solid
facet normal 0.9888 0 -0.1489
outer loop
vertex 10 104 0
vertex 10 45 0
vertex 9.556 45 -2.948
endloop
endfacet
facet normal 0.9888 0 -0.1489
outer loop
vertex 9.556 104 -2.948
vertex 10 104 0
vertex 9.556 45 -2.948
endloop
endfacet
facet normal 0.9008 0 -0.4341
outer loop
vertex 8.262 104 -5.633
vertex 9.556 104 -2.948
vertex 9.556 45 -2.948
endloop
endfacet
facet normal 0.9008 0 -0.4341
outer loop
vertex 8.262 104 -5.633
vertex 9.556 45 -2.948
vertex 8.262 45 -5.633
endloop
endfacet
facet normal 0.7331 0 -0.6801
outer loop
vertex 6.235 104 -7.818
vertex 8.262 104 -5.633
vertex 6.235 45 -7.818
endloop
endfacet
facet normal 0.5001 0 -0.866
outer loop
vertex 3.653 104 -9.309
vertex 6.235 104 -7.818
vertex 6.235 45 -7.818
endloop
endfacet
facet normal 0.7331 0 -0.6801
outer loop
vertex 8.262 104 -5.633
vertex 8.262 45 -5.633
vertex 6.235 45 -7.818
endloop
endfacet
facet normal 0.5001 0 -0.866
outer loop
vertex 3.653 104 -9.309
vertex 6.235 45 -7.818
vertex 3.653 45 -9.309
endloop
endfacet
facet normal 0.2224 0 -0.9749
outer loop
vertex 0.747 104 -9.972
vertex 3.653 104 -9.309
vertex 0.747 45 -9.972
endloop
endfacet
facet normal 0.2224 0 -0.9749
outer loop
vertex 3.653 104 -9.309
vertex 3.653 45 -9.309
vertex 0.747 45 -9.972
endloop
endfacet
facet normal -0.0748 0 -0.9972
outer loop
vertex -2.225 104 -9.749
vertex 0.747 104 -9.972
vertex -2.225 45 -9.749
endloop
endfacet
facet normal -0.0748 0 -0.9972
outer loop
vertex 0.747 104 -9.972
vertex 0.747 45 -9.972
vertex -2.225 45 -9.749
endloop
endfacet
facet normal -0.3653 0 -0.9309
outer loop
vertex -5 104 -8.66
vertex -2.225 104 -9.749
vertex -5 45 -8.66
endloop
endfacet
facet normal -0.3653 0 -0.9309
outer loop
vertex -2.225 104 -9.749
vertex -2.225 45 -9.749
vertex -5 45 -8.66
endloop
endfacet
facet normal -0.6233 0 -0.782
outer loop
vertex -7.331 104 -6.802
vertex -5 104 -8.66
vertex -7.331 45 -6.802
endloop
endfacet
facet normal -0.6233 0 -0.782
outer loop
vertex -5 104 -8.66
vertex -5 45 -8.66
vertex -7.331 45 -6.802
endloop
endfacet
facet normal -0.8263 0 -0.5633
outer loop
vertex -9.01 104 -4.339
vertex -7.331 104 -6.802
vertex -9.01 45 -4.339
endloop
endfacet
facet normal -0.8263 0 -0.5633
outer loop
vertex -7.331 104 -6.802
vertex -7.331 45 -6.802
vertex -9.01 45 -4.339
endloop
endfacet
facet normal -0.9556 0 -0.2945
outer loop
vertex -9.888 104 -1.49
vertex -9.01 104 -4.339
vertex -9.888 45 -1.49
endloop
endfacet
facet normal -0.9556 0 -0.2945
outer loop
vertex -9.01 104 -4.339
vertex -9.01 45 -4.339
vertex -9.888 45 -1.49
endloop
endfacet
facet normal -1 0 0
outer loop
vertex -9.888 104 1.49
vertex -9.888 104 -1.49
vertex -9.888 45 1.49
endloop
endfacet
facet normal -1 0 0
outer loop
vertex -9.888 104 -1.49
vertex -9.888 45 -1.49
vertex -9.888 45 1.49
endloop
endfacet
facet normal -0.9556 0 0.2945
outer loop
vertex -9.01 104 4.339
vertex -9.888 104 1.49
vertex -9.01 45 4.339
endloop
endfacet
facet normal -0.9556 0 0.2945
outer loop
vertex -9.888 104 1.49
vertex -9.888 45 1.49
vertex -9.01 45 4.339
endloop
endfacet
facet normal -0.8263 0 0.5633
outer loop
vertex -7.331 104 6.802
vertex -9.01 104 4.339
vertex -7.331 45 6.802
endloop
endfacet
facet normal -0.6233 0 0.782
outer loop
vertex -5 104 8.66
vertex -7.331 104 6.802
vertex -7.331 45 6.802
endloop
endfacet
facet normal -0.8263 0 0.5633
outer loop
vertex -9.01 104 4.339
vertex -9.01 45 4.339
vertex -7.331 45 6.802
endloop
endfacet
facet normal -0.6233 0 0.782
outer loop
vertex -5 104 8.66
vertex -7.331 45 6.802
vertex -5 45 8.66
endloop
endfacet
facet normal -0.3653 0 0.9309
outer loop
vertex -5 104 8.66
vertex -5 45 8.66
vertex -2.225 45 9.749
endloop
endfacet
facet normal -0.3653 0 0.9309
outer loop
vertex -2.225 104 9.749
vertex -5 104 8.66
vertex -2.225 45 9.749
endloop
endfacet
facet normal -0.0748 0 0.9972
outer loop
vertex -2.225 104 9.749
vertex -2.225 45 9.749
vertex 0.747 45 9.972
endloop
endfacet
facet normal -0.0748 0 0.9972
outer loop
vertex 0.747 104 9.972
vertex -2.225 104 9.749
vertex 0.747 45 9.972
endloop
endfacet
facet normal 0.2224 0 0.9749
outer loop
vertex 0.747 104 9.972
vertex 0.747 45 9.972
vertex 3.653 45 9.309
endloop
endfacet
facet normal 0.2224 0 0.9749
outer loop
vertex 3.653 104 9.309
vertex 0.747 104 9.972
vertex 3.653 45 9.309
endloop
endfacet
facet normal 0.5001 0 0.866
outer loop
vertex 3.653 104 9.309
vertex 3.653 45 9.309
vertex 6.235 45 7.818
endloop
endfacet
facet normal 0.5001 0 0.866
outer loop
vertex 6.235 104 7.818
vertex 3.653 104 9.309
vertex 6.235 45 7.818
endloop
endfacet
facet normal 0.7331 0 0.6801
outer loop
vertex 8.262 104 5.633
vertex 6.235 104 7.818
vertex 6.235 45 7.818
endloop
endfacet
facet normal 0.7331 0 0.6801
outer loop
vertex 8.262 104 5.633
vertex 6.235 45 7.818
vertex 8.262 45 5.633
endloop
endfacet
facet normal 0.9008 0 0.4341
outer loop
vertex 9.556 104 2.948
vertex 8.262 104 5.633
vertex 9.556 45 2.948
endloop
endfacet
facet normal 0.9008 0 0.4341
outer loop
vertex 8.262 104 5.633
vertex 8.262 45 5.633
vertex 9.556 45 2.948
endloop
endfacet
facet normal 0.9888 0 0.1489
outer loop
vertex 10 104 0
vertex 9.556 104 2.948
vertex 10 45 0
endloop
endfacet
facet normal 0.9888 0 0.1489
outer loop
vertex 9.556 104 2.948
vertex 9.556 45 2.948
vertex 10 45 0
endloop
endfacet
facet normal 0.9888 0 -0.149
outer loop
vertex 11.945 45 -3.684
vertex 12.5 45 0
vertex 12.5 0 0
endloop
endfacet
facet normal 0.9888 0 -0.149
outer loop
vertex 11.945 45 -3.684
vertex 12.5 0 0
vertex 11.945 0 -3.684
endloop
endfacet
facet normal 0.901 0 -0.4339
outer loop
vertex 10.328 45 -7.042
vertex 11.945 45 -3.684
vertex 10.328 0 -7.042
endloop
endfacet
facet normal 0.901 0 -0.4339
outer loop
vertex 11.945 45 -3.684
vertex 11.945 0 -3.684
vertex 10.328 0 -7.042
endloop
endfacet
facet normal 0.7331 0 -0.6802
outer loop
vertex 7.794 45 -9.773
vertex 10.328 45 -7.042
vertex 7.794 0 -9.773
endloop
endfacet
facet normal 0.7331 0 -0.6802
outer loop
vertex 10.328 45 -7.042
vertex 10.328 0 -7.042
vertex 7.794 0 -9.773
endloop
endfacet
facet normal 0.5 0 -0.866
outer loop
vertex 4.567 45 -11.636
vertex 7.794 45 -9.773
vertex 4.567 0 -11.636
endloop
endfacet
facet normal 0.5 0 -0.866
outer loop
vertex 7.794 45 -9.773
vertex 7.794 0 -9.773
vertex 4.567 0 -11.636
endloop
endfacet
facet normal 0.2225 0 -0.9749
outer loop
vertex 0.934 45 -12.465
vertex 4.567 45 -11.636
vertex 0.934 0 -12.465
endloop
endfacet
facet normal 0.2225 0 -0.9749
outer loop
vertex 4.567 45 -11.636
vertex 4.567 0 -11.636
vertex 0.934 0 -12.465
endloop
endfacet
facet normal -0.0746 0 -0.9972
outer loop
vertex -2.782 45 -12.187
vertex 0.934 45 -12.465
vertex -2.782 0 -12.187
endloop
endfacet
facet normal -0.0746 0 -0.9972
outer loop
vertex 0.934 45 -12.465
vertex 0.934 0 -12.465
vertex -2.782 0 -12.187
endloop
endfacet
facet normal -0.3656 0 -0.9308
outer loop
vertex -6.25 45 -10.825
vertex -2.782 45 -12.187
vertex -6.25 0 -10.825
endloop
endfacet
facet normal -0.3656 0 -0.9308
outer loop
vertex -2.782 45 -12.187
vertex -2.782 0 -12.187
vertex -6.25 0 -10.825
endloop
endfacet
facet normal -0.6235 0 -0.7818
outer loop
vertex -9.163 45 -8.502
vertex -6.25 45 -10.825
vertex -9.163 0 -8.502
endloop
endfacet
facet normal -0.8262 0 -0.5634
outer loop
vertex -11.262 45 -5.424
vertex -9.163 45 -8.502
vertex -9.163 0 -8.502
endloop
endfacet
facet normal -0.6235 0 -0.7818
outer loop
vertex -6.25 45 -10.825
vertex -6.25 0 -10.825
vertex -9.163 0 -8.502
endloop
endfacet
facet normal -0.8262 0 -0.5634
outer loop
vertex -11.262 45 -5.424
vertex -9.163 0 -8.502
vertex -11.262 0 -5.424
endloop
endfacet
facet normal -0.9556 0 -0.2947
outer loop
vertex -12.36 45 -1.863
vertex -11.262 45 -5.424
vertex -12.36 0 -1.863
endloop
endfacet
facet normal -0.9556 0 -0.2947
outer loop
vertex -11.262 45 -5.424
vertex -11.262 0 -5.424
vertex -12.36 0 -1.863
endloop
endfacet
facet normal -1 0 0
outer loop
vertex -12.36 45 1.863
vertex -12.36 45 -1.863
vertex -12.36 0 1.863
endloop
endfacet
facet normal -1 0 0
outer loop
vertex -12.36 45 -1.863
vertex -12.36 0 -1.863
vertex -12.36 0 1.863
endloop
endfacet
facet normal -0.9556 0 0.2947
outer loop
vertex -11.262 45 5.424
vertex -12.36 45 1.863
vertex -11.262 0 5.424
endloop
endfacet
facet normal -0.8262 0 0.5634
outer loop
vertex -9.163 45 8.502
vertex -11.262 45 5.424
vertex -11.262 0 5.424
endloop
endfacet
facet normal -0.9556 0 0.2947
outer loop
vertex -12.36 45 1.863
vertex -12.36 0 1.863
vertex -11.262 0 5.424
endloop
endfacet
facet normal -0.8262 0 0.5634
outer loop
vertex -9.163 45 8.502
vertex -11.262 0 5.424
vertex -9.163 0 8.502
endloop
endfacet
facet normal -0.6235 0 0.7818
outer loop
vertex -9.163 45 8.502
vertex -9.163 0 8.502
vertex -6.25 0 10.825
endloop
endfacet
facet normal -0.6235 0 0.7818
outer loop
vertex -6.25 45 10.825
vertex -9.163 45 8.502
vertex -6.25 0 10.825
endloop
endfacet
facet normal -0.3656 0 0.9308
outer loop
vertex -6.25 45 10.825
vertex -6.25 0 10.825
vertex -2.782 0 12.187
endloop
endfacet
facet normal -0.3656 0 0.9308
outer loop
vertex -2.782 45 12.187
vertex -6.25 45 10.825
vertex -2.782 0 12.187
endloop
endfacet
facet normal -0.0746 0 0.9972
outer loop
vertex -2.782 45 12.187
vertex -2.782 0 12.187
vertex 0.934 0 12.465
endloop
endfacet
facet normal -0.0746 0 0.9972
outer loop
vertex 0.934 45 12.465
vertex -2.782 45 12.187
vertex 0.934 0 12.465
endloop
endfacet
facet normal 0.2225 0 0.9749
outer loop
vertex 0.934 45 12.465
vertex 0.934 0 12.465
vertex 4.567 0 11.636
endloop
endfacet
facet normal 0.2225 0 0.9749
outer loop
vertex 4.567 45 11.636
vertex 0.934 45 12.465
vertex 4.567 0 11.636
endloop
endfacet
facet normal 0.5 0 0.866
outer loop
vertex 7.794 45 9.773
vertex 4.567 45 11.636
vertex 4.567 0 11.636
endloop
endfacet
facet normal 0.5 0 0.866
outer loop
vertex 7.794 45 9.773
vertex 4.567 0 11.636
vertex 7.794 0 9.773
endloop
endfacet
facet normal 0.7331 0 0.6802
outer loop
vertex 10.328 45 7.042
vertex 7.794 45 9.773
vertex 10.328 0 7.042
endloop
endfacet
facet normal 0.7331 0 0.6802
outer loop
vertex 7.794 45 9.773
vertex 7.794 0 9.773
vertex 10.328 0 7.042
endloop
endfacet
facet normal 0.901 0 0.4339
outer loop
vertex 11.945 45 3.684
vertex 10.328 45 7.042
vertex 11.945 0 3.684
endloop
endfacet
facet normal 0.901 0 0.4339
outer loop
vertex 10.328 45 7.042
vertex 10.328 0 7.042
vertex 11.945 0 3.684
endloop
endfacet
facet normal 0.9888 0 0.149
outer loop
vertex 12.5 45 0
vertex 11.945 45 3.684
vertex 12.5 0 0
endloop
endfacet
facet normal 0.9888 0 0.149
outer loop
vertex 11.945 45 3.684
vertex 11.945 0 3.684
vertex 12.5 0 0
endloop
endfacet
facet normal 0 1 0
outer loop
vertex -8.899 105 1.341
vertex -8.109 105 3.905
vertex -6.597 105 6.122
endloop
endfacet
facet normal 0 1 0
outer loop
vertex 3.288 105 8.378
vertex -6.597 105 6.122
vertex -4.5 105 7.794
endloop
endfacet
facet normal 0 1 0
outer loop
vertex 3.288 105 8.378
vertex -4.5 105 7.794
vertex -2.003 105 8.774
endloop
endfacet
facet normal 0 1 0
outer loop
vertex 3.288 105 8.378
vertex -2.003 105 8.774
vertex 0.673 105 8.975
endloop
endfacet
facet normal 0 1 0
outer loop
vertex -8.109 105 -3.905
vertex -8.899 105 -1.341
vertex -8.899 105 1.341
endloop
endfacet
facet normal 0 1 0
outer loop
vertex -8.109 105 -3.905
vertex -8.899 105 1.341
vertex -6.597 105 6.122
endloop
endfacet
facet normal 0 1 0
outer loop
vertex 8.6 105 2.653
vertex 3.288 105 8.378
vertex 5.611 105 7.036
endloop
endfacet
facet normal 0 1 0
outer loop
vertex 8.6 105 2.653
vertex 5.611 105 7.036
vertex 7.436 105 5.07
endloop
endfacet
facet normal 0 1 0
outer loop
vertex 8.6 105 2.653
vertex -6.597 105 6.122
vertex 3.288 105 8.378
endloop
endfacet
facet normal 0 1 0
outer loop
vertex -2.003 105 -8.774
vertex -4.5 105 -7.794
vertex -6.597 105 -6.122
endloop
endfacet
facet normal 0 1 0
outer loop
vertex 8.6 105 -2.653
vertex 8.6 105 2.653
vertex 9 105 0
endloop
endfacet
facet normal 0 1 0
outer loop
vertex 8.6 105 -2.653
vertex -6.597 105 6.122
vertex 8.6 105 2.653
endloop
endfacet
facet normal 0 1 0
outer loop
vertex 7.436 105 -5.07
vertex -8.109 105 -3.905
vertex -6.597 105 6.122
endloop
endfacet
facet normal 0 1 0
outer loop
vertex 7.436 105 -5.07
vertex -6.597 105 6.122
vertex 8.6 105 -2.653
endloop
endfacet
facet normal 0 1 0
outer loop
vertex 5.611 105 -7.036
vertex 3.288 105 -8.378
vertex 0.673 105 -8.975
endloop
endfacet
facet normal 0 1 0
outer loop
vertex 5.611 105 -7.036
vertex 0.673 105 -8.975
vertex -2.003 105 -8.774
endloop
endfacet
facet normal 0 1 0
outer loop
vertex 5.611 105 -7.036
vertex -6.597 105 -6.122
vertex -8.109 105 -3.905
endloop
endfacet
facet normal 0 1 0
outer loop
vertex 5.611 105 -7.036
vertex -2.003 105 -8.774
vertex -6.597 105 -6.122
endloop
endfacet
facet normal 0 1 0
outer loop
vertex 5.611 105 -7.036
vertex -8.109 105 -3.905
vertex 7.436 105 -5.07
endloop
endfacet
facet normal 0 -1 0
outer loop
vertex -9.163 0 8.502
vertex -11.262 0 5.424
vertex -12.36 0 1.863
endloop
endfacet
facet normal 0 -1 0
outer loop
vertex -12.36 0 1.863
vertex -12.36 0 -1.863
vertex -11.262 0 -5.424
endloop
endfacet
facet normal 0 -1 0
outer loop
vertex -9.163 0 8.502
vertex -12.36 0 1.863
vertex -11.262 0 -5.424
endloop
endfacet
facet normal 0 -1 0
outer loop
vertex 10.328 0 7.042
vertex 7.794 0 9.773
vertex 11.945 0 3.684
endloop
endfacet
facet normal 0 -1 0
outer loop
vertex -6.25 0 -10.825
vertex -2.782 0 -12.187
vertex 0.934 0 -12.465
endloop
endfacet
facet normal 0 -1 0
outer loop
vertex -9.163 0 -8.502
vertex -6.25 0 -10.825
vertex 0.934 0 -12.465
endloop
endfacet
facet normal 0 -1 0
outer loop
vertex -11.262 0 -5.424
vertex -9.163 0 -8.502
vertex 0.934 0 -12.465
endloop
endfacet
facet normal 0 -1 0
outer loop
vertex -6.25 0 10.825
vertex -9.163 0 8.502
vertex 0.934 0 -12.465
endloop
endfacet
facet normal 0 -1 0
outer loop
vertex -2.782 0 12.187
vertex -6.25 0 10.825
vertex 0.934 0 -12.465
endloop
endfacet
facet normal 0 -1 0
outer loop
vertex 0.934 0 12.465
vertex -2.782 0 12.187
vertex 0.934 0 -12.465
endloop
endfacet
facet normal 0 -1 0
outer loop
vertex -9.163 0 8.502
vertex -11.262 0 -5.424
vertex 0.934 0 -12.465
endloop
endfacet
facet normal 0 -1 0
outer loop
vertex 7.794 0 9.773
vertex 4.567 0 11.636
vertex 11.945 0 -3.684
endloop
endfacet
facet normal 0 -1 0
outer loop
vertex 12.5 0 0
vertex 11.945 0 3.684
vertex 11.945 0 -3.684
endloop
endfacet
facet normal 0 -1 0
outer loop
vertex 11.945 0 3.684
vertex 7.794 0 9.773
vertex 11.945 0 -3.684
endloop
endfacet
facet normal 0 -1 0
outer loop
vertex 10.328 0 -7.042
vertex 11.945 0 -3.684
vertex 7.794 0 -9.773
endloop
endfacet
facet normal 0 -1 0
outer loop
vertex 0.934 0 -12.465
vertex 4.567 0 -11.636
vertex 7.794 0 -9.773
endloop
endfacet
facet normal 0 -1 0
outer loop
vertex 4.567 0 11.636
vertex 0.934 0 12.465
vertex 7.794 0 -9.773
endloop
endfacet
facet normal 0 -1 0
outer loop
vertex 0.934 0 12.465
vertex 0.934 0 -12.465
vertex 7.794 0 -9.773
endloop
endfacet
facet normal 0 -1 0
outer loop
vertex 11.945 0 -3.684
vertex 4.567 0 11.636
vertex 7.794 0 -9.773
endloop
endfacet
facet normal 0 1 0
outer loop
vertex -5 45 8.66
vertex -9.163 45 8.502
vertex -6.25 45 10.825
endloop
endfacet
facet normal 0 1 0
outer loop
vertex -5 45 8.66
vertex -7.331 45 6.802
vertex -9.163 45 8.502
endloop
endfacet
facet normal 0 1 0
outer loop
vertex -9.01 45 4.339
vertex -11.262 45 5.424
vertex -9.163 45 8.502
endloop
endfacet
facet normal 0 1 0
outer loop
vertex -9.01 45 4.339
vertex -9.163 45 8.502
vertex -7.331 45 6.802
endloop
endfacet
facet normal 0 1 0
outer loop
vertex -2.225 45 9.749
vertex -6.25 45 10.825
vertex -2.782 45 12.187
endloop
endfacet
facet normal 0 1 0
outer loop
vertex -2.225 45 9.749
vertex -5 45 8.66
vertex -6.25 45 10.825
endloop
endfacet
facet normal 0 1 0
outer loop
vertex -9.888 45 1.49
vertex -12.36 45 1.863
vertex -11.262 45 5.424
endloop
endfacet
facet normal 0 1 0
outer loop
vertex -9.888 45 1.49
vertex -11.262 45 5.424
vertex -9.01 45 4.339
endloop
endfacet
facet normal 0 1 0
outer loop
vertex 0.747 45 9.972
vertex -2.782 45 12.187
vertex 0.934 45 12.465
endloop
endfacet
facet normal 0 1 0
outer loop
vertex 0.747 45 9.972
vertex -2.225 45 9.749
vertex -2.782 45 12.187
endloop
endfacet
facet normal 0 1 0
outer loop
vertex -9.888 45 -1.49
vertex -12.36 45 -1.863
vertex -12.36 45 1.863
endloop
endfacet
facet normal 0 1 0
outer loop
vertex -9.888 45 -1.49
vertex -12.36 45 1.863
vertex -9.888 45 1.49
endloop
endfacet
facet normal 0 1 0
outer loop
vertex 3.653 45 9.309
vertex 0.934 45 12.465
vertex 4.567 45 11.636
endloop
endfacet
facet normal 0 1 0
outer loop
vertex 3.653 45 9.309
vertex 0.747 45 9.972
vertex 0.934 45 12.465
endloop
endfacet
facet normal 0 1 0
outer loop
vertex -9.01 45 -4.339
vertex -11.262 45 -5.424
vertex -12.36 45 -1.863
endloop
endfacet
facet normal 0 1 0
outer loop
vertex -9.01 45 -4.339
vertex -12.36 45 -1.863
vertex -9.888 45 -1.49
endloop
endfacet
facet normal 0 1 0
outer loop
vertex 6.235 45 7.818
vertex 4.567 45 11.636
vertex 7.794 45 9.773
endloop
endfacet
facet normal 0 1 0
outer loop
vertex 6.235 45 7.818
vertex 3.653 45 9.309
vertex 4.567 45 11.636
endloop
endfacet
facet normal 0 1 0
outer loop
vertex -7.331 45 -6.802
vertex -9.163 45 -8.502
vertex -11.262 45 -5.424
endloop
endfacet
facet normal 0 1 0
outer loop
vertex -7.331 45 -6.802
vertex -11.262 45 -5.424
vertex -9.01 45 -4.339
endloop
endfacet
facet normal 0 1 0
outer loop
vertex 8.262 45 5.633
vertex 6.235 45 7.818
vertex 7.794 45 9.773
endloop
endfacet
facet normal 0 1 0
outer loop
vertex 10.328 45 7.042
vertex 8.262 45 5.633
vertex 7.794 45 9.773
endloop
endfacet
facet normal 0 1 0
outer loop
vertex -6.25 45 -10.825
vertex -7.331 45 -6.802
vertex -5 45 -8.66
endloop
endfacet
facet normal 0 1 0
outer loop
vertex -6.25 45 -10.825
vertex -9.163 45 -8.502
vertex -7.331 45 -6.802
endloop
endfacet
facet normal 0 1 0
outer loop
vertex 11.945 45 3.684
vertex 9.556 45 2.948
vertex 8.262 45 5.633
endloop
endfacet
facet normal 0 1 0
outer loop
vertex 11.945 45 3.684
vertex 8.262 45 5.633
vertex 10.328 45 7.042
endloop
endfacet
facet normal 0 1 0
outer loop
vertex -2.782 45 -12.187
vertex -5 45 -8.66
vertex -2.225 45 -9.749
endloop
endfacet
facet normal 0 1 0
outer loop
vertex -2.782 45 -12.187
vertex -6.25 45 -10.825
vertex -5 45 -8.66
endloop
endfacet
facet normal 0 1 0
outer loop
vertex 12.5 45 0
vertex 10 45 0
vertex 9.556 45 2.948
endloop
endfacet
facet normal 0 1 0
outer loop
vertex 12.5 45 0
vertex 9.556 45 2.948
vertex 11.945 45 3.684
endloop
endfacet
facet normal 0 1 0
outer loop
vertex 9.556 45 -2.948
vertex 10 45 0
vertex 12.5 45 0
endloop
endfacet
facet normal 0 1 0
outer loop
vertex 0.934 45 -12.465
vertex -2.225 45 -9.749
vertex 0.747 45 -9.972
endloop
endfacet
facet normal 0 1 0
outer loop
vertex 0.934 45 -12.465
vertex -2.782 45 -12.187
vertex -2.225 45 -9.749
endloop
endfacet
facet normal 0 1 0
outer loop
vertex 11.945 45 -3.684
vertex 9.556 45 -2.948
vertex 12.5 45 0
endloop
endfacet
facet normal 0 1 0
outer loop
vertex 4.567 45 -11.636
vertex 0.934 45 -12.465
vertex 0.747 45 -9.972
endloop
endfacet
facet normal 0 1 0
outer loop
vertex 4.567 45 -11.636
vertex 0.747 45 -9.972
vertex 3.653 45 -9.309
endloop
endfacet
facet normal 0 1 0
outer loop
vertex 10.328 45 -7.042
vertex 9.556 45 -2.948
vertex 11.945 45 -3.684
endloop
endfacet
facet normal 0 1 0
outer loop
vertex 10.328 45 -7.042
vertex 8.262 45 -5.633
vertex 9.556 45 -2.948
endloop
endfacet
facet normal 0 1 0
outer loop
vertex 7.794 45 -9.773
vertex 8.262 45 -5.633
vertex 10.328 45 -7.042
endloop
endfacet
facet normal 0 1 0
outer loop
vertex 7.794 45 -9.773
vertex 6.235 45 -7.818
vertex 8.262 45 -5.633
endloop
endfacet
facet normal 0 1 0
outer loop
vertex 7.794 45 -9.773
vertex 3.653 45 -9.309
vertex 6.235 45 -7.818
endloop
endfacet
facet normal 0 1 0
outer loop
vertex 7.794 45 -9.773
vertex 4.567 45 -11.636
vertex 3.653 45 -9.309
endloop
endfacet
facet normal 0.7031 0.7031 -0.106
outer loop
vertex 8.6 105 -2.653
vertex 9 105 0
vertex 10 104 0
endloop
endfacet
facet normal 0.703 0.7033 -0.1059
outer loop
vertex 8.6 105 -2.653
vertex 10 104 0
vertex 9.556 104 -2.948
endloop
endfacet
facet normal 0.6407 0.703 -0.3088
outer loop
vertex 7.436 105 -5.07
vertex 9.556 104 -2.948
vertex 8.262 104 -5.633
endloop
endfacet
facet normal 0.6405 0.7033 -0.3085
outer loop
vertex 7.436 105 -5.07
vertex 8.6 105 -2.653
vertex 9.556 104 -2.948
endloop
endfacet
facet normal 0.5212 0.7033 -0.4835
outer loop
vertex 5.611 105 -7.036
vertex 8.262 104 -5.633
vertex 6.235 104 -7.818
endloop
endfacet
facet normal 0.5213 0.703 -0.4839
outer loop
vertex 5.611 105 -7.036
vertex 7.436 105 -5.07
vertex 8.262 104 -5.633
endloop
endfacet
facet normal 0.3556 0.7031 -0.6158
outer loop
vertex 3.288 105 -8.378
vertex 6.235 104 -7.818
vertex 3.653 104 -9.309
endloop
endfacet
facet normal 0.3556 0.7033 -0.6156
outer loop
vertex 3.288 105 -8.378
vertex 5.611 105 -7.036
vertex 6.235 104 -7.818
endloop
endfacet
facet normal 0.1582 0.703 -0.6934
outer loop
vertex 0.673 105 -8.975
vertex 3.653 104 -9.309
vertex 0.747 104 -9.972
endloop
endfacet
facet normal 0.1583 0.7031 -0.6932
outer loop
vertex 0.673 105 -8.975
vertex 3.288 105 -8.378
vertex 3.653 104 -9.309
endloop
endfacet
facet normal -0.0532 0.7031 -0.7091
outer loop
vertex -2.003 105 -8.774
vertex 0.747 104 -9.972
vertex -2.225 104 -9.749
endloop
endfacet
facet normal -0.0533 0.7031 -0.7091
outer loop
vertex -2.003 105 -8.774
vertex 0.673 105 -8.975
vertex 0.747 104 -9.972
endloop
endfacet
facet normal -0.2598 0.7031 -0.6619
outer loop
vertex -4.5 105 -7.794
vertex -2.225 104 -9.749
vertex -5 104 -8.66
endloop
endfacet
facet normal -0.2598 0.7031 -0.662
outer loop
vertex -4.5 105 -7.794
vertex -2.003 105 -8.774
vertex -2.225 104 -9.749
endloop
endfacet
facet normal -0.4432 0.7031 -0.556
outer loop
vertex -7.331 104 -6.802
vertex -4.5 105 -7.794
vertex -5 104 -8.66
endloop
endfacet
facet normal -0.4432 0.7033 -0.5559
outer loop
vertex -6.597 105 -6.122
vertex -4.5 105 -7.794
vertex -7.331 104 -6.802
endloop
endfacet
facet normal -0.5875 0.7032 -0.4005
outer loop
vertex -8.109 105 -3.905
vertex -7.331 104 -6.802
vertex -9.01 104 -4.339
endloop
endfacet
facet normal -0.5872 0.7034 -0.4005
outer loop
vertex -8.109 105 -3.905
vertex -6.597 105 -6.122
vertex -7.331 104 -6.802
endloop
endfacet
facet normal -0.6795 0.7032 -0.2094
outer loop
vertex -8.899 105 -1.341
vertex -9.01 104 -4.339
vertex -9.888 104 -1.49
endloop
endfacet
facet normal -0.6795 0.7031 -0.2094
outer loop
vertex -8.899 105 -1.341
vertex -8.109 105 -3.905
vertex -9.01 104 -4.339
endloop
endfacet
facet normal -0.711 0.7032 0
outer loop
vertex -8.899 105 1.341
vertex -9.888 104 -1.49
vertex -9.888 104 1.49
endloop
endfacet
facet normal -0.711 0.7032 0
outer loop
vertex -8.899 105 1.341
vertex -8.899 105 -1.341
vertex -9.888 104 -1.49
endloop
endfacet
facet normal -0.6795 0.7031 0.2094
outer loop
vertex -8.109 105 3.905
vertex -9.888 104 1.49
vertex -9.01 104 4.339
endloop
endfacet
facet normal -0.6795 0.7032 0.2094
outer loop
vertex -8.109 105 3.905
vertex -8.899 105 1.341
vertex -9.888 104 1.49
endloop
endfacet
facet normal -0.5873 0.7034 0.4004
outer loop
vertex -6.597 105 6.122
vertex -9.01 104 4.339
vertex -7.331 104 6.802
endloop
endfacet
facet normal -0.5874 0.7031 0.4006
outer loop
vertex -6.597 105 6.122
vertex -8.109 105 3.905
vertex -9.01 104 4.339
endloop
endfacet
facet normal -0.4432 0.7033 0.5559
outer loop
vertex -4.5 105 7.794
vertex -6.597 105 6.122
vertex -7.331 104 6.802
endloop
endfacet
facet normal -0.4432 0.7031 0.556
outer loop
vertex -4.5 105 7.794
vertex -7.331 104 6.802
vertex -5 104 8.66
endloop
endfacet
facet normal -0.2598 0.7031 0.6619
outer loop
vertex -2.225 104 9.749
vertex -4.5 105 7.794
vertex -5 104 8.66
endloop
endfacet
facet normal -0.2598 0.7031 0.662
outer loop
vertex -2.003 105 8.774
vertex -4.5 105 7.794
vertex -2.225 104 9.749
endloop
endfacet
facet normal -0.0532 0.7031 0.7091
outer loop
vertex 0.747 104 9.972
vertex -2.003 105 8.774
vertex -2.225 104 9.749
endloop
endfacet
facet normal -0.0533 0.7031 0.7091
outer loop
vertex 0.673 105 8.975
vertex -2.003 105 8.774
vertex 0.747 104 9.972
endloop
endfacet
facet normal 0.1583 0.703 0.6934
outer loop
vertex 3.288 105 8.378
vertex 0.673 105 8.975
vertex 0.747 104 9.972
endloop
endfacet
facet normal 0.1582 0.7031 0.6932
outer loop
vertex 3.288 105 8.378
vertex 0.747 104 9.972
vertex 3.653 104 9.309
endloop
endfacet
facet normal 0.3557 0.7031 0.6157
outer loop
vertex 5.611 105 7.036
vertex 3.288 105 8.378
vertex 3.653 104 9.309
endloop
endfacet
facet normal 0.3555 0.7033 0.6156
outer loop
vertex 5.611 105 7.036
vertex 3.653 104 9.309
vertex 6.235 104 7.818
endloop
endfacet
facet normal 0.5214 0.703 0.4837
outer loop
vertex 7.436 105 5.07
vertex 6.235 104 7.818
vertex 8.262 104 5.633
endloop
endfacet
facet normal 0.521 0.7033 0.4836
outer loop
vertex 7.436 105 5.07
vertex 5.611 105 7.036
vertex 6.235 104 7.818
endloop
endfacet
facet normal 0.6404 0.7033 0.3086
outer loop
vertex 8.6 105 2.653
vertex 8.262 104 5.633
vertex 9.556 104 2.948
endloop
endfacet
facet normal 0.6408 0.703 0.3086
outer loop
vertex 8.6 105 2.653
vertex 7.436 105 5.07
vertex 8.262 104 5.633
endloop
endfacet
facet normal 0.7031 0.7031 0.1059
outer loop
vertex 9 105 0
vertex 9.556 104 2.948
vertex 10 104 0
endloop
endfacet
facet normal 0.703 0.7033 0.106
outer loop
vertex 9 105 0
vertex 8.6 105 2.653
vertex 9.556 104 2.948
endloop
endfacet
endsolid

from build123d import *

# Parameters (mm, degrees)
SKETCH1_R           = 12.5
BOSS_EXTRUDE1_DEPTH = 45
SKETCH2_R           = 10
BOSS_EXTRUDE2_DEPTH = 60
CHAMFER1_SIZE       = 1


with BuildPart() as part:
    # Sketch1 → Boss-Extrude1 (new body)
    with BuildSketch(Plane(origin=(0, 0, 0), x_dir=(1, 0, 0), z_dir=(0, 1, 0))):
        Circle(SKETCH1_R)
    extrude(amount=BOSS_EXTRUDE1_DEPTH)

    # Sketch2 → Boss-Extrude2 (add)
    with BuildSketch(Plane(origin=(0, 45, 0), x_dir=(1, 0, 0), z_dir=(0, 1, 0))):
        Circle(SKETCH2_R)
    extrude(amount=BOSS_EXTRUDE2_DEPTH)

    # Chamfer1
    chamfer1_edges = [part.edges().sort_by_distance(p)[0] for p in [
        (-10, 105, 0),
    ]]
    chamfer(chamfer1_edges, length=CHAMFER1_SIZE)


solid = part.part
